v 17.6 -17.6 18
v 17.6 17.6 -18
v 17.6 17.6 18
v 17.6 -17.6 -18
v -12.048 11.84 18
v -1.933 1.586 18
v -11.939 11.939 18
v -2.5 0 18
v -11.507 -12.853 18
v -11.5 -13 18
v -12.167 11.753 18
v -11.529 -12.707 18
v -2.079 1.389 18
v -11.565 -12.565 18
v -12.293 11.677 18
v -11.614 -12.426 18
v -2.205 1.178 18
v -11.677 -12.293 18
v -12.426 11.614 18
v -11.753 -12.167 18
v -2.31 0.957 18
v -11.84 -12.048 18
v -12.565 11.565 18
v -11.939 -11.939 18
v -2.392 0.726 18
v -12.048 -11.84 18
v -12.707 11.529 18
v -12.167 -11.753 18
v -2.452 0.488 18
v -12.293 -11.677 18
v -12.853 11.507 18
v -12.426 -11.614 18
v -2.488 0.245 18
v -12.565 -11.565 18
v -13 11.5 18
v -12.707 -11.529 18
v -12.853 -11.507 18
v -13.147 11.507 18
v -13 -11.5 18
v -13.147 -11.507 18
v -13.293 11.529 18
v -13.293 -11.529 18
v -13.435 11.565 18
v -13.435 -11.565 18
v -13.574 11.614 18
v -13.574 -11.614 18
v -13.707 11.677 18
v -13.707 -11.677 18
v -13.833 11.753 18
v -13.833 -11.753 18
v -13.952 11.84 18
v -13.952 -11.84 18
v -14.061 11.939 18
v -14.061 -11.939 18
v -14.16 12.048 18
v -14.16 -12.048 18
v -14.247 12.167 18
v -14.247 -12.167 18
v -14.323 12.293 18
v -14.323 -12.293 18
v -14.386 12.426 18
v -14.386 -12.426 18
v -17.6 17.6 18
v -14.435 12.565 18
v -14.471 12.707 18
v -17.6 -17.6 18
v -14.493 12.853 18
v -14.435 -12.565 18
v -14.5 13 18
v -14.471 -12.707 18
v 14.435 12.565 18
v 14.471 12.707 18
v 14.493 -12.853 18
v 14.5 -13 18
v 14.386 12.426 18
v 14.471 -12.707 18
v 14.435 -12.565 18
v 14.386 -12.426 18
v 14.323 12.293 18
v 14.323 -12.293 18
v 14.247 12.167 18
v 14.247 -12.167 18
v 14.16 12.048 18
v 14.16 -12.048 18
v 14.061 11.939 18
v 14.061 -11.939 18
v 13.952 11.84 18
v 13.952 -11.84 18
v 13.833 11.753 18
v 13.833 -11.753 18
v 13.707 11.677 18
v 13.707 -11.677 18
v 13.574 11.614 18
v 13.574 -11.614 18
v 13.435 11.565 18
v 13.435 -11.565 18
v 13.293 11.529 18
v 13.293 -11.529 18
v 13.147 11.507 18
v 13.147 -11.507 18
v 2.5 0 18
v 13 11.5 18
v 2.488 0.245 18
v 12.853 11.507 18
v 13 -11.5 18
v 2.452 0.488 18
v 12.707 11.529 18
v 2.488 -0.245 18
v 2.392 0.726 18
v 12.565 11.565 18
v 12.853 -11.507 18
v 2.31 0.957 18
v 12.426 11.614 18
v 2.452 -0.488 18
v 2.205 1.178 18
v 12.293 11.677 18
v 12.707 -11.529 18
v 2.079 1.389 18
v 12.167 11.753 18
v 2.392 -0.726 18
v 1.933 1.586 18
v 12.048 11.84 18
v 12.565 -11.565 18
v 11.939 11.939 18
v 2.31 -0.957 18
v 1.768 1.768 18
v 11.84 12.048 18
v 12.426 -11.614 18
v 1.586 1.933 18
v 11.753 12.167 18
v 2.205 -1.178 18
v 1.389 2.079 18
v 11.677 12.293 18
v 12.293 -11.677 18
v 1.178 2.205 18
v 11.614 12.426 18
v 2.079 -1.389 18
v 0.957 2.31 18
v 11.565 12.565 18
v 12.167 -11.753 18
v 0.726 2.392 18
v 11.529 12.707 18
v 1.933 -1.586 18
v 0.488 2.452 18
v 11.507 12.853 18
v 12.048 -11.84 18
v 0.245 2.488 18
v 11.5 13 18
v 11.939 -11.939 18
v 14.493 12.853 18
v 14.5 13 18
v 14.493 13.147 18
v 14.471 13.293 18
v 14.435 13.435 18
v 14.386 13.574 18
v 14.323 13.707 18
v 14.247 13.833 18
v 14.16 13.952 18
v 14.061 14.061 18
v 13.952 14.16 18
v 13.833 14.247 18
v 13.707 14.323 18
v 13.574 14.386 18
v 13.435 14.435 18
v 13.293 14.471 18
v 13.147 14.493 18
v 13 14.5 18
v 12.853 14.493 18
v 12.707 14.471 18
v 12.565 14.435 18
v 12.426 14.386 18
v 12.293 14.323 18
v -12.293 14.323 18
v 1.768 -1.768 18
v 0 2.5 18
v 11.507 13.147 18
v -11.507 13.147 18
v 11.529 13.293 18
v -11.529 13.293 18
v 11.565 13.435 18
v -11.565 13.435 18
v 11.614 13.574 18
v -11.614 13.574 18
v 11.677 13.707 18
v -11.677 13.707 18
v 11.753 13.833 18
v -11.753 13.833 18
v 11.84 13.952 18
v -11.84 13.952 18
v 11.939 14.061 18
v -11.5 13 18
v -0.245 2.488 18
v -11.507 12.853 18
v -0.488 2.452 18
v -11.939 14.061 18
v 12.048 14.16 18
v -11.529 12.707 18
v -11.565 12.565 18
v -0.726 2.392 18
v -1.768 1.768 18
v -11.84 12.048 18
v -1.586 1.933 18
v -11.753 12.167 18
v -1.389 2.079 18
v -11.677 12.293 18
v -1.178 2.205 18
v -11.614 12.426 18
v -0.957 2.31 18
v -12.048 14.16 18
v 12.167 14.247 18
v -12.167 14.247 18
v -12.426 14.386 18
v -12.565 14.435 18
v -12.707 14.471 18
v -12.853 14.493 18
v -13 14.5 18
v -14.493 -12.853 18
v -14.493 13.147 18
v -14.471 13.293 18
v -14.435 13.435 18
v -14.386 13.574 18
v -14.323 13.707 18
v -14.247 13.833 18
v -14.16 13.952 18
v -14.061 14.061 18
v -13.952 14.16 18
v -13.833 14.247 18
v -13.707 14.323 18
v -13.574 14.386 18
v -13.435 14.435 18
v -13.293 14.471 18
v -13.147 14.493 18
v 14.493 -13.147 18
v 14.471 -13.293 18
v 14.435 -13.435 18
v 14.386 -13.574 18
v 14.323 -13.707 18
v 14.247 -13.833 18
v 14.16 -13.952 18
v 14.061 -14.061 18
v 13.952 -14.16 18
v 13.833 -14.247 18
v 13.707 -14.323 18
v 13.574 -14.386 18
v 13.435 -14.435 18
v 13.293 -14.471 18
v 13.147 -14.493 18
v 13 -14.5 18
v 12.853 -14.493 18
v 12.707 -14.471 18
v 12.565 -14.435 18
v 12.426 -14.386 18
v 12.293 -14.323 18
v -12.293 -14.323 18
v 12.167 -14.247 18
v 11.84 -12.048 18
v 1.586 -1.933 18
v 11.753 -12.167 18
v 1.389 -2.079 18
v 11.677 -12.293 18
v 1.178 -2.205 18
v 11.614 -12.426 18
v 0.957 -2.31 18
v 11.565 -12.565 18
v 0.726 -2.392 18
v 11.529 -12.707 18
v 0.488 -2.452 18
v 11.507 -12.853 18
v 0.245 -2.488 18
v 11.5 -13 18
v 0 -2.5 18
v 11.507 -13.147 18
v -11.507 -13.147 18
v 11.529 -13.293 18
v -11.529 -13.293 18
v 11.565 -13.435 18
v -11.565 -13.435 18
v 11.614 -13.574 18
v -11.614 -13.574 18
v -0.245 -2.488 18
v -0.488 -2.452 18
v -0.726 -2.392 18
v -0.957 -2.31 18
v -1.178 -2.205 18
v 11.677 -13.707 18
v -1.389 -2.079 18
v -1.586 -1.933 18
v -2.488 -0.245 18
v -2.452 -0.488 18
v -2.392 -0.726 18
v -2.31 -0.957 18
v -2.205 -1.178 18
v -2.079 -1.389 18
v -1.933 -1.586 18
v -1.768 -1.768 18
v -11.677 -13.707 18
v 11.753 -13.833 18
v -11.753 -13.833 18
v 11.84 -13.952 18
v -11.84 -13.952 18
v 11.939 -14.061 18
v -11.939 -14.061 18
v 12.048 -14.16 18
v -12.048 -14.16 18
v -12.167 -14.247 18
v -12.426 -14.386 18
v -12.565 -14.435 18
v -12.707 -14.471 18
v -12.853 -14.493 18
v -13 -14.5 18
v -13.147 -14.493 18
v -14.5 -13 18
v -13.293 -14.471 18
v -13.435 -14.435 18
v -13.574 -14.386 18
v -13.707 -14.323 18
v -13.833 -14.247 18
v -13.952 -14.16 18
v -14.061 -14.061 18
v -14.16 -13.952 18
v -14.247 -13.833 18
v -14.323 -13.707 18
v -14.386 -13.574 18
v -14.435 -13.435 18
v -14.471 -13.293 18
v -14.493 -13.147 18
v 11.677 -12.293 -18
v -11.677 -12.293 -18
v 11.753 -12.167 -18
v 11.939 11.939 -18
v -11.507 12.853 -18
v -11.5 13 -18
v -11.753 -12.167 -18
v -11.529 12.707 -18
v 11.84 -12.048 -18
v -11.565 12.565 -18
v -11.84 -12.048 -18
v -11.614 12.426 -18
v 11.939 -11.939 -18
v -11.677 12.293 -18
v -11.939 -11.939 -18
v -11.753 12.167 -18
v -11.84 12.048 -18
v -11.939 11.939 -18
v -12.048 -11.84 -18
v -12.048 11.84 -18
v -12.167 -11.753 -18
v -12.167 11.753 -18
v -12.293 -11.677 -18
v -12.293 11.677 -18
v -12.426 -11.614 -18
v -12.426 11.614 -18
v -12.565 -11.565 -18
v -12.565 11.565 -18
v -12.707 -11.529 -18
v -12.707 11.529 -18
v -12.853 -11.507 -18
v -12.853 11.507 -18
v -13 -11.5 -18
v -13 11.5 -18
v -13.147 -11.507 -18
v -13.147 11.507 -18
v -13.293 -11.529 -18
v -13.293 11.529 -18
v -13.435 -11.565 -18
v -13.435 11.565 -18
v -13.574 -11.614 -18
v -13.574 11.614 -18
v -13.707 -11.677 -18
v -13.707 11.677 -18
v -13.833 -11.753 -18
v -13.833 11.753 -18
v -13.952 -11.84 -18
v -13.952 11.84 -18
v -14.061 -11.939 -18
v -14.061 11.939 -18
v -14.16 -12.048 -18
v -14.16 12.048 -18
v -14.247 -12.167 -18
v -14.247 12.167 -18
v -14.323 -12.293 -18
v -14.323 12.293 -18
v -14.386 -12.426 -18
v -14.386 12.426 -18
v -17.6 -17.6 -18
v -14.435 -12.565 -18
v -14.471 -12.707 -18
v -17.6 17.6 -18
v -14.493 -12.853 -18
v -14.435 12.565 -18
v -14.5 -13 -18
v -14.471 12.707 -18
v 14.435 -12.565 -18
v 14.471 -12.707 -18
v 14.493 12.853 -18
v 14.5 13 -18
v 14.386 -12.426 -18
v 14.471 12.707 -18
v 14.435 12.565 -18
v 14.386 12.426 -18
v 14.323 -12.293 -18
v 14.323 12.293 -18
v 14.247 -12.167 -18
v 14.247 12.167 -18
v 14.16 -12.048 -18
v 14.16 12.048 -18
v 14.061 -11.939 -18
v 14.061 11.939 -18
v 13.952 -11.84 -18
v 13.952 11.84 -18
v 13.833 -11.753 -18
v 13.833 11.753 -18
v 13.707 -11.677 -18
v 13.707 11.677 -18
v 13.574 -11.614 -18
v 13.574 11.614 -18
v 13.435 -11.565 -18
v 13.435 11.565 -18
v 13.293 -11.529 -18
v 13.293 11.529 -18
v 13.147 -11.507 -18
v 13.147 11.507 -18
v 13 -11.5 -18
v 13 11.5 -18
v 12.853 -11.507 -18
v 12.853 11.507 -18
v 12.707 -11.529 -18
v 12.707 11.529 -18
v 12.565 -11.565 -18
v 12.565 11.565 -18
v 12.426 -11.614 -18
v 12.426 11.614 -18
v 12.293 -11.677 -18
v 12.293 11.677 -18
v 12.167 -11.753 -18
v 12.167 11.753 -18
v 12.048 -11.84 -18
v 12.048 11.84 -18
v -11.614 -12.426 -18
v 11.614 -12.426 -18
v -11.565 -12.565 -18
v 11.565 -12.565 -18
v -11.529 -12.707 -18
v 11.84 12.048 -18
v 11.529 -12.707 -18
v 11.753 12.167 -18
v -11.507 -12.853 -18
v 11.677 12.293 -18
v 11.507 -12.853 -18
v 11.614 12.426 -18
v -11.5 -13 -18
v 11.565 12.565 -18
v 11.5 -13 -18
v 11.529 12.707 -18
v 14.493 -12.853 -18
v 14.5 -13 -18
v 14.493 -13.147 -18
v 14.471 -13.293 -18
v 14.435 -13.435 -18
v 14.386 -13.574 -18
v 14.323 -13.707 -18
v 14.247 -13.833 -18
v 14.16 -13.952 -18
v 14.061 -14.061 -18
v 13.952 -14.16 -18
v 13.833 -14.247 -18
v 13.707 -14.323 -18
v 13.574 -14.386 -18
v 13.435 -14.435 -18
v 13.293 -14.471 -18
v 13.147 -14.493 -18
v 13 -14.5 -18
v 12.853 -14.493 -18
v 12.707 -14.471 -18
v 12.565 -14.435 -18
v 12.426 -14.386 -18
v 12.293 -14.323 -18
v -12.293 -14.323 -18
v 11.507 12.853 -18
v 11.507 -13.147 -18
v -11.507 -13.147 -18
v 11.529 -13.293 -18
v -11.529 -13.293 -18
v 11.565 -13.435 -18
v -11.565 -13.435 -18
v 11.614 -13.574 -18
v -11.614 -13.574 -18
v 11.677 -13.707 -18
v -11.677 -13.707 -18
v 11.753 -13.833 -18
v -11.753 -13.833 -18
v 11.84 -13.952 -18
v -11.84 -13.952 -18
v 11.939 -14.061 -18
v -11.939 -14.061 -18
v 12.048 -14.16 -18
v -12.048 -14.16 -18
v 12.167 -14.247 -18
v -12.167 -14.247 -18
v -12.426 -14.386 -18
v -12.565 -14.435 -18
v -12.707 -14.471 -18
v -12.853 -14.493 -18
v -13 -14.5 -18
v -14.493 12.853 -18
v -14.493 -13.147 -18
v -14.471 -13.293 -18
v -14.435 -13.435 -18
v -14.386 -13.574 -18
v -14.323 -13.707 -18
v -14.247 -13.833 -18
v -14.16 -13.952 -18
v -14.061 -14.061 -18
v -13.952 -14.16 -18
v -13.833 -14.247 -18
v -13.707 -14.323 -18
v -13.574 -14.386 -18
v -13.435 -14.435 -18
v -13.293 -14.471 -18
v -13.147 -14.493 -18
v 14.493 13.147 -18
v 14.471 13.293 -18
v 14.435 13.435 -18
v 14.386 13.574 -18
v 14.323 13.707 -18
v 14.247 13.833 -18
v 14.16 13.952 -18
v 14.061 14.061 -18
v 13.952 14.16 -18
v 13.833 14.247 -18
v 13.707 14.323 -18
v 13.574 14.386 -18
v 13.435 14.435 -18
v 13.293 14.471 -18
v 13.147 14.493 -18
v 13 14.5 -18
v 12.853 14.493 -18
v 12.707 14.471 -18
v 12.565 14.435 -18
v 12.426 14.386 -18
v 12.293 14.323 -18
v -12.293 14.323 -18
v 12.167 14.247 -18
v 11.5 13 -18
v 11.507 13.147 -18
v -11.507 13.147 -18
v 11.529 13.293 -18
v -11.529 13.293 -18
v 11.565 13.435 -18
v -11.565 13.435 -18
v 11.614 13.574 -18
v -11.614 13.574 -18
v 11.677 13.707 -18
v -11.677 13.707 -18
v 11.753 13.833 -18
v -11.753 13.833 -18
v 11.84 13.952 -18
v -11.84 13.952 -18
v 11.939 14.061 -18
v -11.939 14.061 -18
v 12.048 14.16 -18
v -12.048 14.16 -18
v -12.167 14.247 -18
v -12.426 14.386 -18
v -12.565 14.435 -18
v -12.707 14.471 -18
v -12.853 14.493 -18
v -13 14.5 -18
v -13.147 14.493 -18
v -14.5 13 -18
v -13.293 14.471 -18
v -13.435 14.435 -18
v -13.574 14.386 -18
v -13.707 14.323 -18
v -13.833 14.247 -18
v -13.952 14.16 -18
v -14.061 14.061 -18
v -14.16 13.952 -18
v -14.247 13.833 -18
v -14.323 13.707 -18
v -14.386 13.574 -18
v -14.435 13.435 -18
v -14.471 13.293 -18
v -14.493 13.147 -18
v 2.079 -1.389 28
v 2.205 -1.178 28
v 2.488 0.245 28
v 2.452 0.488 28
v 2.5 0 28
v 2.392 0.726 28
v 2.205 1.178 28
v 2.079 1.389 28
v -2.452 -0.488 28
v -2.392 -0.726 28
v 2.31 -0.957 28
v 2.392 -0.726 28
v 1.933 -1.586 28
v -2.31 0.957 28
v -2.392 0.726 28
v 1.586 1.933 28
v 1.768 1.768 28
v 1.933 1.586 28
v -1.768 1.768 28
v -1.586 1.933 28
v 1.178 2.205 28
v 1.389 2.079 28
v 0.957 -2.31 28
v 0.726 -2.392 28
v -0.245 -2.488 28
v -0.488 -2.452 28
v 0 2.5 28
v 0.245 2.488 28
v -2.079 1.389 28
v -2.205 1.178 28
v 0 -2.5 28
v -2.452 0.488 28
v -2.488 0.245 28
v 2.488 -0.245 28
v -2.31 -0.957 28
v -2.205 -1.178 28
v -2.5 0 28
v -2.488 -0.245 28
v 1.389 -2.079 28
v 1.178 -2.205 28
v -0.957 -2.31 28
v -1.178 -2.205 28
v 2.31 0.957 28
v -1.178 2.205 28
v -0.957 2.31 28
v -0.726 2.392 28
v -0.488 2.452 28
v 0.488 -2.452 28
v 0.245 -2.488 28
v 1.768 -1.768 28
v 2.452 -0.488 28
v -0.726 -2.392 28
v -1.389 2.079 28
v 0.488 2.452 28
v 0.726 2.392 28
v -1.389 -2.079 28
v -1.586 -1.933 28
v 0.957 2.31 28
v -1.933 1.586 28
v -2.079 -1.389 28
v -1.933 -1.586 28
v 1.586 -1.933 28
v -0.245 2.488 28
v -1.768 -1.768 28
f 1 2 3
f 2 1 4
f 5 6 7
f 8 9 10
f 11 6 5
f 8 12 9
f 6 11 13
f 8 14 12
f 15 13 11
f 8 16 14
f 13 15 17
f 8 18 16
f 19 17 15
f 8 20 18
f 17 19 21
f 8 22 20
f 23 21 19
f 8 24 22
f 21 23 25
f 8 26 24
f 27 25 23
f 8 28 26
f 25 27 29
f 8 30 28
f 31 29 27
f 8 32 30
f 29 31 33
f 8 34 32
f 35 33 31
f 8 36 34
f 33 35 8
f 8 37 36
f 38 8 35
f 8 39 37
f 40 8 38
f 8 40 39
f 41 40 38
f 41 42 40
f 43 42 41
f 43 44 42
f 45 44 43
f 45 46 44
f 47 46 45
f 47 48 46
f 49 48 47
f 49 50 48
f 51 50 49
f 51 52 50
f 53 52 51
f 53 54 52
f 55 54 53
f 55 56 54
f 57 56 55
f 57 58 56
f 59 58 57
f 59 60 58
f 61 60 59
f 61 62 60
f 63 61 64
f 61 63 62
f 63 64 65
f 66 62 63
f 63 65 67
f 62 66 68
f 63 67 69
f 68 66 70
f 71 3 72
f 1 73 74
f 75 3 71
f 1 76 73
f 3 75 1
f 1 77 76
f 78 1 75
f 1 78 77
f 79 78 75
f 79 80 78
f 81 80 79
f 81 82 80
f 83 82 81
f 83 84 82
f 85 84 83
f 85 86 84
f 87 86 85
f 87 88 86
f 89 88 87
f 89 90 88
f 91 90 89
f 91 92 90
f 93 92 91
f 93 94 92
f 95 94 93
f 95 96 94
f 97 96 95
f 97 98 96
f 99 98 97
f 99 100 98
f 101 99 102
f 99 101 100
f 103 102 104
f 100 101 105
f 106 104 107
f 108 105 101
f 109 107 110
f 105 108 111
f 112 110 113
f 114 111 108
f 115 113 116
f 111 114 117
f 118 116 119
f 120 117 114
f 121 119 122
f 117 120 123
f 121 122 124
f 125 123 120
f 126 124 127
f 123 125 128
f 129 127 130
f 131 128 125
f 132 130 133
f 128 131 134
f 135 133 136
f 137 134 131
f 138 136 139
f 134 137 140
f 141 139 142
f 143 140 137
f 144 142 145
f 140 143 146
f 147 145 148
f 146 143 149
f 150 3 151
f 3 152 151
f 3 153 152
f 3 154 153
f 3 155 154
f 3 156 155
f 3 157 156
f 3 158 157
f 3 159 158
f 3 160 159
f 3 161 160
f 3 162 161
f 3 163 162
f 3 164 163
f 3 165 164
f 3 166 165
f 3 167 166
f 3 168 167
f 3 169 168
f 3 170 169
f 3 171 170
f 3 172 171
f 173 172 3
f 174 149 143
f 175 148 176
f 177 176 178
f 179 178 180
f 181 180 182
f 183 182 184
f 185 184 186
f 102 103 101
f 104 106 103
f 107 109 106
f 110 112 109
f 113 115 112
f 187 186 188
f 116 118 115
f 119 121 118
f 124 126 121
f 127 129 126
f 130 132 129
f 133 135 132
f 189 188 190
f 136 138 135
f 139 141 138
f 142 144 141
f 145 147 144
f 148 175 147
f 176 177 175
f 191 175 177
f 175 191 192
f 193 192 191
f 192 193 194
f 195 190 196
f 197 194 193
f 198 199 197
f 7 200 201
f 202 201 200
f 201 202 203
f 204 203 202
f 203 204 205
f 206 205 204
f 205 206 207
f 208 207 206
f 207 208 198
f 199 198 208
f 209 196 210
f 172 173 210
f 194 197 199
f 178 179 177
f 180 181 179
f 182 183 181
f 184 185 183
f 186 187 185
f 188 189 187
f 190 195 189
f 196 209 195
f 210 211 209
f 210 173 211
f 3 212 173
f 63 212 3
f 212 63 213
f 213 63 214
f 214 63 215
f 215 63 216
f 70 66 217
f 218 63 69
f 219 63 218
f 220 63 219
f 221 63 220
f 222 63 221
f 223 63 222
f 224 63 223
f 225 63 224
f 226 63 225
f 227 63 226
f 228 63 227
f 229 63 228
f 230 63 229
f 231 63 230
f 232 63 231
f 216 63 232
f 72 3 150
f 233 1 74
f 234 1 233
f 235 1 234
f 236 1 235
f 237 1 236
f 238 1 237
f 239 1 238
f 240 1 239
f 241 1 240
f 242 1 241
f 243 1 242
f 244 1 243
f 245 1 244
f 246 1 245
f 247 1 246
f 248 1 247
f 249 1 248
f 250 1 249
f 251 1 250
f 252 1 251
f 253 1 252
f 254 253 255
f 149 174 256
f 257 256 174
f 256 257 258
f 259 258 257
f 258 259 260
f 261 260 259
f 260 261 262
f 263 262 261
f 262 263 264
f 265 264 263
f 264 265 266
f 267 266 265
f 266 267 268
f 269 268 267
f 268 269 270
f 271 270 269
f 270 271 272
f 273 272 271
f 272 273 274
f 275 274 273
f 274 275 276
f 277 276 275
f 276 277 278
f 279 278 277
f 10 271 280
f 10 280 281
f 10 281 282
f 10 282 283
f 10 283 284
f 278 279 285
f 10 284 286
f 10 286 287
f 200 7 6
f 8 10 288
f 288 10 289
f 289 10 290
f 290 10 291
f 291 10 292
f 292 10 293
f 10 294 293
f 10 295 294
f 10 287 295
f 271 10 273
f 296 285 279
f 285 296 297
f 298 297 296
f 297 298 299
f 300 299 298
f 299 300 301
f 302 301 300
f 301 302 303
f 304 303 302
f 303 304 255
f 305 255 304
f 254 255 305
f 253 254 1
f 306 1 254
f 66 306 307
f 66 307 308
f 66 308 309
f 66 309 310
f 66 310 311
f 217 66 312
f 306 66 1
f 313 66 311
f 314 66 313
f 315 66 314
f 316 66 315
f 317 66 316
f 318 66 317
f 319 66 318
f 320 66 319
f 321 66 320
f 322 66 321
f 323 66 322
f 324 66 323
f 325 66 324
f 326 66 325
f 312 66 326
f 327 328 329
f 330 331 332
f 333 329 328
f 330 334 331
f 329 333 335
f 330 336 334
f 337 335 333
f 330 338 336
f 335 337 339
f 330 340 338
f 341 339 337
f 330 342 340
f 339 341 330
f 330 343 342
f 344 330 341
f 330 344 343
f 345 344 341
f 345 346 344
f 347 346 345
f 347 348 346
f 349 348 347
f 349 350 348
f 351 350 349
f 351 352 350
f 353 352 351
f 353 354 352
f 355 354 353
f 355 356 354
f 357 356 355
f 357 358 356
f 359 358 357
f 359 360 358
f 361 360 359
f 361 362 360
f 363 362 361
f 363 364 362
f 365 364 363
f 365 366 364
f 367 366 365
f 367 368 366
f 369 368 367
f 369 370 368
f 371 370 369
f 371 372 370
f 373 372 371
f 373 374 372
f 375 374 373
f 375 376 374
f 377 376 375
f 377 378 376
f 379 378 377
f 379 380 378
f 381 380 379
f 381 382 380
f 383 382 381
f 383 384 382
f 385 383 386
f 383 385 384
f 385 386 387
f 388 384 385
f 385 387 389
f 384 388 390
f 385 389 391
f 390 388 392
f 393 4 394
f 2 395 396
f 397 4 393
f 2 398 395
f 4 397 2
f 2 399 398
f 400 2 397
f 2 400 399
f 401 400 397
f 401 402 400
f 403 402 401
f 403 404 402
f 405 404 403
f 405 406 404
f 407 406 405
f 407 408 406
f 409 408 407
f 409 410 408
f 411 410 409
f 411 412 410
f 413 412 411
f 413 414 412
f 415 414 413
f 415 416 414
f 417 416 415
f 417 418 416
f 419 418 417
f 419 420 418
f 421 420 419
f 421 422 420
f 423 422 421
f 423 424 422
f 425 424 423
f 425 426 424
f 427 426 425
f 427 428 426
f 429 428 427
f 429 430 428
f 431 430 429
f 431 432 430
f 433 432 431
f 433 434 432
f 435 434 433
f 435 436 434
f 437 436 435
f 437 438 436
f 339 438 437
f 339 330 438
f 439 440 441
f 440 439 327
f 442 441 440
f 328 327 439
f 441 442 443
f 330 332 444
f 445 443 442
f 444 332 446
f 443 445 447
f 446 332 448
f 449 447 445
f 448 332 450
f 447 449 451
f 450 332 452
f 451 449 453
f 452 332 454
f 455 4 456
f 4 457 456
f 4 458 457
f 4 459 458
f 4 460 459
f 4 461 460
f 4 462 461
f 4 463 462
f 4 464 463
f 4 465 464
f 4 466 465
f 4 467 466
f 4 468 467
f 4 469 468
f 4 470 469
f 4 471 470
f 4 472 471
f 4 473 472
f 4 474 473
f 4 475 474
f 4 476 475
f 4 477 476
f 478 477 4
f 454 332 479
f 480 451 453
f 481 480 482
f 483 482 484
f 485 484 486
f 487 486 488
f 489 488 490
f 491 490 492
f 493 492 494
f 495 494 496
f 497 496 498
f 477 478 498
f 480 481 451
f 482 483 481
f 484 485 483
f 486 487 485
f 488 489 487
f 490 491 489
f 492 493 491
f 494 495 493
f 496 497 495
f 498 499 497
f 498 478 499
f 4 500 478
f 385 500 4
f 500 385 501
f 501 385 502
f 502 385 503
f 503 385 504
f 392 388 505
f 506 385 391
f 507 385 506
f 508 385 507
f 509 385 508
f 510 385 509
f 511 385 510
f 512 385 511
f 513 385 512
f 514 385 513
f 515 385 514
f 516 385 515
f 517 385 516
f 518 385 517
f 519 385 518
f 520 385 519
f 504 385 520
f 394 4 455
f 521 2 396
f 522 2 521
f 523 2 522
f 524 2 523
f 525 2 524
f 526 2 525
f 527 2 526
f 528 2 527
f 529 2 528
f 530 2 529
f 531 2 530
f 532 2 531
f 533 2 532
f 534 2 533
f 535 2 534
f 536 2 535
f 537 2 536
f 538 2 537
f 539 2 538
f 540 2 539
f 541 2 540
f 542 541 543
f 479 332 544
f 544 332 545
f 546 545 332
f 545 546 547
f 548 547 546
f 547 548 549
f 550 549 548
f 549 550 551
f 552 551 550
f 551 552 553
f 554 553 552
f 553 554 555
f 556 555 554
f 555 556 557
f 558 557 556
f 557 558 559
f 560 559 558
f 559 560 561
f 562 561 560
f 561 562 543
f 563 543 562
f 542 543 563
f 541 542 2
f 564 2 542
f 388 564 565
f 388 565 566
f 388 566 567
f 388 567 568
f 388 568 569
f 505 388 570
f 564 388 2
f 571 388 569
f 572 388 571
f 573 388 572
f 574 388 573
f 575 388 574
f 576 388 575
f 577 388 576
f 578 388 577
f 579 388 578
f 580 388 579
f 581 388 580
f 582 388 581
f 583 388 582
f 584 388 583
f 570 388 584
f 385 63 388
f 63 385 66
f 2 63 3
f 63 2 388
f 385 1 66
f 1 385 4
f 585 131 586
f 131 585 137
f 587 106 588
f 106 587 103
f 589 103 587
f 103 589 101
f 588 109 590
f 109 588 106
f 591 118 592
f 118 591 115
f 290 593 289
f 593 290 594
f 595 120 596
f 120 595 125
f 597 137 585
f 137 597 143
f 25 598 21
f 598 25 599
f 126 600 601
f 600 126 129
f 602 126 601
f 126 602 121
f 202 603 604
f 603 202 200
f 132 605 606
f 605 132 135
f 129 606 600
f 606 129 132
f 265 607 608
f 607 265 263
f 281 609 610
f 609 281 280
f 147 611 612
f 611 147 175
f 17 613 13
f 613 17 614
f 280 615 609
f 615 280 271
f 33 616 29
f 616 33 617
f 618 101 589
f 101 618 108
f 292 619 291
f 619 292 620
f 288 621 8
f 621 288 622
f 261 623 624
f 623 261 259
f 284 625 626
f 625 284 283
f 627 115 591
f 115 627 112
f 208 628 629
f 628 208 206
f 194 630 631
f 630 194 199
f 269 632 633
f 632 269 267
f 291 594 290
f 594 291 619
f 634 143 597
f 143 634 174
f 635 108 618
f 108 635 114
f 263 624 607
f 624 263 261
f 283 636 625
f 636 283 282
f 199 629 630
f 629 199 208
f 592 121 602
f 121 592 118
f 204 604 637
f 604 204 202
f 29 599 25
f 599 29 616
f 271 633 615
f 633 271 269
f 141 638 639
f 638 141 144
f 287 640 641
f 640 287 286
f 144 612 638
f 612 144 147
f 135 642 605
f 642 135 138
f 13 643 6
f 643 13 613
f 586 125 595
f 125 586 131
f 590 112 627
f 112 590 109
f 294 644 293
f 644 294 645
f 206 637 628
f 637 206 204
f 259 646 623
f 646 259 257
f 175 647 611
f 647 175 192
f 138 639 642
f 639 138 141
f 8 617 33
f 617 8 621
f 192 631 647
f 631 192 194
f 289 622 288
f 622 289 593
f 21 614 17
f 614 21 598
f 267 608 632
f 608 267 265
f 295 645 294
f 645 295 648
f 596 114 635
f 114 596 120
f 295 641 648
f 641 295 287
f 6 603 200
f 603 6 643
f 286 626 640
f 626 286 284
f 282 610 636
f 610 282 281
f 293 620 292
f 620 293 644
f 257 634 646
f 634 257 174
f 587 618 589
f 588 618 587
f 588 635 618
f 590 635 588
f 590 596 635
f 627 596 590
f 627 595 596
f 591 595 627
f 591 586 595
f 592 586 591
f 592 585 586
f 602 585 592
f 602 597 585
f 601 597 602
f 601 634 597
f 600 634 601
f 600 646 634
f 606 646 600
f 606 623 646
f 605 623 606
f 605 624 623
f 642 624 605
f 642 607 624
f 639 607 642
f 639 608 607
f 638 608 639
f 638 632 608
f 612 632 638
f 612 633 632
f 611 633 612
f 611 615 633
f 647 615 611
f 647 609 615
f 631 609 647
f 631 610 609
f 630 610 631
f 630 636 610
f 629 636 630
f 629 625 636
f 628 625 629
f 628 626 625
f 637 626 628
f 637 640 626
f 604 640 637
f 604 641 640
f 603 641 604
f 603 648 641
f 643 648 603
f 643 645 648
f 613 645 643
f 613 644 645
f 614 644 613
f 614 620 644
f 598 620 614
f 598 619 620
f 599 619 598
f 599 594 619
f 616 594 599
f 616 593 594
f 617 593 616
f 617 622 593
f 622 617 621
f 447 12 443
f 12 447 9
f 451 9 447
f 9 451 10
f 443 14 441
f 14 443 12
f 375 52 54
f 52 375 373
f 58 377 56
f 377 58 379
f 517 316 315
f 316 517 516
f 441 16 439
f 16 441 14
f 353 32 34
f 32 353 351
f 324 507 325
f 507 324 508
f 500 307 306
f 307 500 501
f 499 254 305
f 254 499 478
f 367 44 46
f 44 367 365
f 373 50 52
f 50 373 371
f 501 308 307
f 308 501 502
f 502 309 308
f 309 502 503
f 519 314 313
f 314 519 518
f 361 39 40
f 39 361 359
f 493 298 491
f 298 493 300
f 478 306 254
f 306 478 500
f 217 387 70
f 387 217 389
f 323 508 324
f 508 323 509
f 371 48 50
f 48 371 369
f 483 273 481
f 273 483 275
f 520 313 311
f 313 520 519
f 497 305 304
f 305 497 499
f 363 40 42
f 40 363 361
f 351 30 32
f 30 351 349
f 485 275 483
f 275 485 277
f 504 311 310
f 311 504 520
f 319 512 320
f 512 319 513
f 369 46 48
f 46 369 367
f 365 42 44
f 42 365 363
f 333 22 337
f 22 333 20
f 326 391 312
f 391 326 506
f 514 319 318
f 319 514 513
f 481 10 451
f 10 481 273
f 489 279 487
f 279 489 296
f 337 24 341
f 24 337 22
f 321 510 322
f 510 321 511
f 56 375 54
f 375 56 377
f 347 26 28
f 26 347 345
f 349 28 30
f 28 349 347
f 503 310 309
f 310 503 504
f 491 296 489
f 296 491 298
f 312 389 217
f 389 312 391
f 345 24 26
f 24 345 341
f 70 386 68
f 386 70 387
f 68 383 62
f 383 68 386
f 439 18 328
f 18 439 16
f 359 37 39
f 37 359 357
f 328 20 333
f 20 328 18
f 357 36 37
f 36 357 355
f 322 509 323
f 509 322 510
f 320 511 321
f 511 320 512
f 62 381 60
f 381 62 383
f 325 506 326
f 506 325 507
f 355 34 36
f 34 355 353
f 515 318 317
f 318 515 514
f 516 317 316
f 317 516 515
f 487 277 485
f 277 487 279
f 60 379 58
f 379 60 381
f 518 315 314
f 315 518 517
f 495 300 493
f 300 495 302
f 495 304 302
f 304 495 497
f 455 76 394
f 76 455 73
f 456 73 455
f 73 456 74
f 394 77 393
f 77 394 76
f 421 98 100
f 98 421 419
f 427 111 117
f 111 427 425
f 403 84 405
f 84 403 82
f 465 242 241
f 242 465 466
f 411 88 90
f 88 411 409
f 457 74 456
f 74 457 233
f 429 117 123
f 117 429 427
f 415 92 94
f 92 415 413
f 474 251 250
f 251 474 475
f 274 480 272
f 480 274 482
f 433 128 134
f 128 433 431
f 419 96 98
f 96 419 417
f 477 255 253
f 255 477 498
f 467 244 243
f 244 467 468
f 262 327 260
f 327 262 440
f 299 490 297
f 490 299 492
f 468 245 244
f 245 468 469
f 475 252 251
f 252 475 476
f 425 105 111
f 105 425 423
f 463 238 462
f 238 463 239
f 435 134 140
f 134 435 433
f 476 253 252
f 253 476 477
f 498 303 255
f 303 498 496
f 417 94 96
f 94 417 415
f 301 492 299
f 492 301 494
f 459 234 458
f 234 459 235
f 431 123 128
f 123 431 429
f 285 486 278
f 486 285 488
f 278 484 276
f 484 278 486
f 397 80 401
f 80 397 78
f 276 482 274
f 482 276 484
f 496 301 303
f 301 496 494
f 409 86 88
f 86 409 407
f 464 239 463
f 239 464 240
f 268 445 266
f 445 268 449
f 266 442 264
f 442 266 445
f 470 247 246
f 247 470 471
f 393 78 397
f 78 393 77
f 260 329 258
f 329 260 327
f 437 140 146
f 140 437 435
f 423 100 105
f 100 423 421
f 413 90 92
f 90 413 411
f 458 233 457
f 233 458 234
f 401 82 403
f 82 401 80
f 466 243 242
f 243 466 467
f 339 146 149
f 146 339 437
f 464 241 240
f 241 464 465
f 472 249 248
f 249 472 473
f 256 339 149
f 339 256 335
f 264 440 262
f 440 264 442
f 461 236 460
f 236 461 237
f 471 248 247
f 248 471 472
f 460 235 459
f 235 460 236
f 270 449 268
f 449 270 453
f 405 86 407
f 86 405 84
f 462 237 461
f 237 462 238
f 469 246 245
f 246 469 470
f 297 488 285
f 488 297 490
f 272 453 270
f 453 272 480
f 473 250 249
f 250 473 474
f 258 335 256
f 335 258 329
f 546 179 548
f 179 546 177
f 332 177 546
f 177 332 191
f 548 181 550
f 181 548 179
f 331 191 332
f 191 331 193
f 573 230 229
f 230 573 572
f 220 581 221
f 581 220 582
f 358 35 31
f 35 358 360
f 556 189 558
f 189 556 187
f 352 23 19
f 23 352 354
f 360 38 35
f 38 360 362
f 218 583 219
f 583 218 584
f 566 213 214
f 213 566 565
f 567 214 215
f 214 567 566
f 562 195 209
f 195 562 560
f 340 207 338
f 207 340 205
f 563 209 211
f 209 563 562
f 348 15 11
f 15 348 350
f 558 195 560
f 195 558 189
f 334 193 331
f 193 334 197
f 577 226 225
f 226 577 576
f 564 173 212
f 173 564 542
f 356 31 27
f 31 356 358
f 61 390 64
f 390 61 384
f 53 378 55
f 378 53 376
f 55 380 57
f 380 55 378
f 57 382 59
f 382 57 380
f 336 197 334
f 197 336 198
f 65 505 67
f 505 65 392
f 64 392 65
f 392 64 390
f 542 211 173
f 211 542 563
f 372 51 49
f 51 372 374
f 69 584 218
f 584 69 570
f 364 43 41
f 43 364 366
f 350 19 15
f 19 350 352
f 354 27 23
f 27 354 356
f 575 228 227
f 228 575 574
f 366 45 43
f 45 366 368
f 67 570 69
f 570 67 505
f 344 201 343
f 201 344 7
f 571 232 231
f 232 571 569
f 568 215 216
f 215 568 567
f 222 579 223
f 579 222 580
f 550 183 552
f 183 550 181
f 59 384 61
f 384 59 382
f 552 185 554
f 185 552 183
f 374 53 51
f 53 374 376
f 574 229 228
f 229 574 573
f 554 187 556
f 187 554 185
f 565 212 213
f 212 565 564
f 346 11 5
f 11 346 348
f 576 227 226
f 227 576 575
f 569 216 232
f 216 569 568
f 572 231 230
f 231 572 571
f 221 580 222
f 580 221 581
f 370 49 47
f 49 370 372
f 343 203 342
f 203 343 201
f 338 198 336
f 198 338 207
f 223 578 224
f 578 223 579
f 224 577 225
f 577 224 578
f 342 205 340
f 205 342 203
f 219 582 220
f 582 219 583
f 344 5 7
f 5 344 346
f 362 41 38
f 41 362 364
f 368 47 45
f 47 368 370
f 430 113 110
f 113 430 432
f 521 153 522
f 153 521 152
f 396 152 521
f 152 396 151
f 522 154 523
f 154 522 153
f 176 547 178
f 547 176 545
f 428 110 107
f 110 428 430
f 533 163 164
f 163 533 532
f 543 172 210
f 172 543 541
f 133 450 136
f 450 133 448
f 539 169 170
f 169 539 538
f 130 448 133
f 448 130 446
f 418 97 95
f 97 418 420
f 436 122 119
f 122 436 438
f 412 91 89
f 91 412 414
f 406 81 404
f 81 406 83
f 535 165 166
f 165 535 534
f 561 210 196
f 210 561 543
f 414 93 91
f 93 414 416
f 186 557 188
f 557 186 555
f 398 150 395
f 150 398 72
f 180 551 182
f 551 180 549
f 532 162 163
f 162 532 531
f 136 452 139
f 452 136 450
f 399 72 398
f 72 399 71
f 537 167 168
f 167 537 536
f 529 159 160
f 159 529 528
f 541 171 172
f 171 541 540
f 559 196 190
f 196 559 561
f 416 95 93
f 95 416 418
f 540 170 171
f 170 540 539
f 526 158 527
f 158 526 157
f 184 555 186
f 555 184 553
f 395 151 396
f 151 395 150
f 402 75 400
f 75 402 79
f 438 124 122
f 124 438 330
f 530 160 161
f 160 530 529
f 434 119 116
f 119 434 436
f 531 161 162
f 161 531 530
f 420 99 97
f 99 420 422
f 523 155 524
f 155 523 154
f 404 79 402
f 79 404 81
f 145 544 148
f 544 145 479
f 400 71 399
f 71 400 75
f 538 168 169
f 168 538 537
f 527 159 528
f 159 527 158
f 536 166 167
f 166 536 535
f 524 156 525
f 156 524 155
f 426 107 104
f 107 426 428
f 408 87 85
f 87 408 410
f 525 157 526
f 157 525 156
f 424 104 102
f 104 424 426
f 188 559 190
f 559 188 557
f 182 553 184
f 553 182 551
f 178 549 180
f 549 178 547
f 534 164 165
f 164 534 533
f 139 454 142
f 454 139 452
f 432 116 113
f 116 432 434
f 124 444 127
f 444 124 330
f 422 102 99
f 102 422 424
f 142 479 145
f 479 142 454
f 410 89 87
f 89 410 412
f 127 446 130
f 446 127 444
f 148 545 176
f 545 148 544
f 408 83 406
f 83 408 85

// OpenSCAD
module stepper_motor() {
    difference() {
        union() {
            // Main body of the motor
            translate([-17.6, -17.6, -18])
                cube([35.2, 35.2, 36.0]);
            
            // Shaft
            translate([0, 0, 18])
                cylinder(h=10, d=5.0, $fn=64);
        }
        
        // Mounting holes
        translate([-13, -13, -18])
            cylinder(h=36.0, d=3.0, $fn=64);
        translate([13, -13, -18])
            cylinder(h=36.0, d=3.0, $fn=64);
        translate([-13, 13, -18])
            cylinder(h=36.0, d=3.0, $fn=64);
        translate([13, 13, -18])
            cylinder(h=36.0, d=3.0, $fn=64);
    }
}

stepper_motor();
